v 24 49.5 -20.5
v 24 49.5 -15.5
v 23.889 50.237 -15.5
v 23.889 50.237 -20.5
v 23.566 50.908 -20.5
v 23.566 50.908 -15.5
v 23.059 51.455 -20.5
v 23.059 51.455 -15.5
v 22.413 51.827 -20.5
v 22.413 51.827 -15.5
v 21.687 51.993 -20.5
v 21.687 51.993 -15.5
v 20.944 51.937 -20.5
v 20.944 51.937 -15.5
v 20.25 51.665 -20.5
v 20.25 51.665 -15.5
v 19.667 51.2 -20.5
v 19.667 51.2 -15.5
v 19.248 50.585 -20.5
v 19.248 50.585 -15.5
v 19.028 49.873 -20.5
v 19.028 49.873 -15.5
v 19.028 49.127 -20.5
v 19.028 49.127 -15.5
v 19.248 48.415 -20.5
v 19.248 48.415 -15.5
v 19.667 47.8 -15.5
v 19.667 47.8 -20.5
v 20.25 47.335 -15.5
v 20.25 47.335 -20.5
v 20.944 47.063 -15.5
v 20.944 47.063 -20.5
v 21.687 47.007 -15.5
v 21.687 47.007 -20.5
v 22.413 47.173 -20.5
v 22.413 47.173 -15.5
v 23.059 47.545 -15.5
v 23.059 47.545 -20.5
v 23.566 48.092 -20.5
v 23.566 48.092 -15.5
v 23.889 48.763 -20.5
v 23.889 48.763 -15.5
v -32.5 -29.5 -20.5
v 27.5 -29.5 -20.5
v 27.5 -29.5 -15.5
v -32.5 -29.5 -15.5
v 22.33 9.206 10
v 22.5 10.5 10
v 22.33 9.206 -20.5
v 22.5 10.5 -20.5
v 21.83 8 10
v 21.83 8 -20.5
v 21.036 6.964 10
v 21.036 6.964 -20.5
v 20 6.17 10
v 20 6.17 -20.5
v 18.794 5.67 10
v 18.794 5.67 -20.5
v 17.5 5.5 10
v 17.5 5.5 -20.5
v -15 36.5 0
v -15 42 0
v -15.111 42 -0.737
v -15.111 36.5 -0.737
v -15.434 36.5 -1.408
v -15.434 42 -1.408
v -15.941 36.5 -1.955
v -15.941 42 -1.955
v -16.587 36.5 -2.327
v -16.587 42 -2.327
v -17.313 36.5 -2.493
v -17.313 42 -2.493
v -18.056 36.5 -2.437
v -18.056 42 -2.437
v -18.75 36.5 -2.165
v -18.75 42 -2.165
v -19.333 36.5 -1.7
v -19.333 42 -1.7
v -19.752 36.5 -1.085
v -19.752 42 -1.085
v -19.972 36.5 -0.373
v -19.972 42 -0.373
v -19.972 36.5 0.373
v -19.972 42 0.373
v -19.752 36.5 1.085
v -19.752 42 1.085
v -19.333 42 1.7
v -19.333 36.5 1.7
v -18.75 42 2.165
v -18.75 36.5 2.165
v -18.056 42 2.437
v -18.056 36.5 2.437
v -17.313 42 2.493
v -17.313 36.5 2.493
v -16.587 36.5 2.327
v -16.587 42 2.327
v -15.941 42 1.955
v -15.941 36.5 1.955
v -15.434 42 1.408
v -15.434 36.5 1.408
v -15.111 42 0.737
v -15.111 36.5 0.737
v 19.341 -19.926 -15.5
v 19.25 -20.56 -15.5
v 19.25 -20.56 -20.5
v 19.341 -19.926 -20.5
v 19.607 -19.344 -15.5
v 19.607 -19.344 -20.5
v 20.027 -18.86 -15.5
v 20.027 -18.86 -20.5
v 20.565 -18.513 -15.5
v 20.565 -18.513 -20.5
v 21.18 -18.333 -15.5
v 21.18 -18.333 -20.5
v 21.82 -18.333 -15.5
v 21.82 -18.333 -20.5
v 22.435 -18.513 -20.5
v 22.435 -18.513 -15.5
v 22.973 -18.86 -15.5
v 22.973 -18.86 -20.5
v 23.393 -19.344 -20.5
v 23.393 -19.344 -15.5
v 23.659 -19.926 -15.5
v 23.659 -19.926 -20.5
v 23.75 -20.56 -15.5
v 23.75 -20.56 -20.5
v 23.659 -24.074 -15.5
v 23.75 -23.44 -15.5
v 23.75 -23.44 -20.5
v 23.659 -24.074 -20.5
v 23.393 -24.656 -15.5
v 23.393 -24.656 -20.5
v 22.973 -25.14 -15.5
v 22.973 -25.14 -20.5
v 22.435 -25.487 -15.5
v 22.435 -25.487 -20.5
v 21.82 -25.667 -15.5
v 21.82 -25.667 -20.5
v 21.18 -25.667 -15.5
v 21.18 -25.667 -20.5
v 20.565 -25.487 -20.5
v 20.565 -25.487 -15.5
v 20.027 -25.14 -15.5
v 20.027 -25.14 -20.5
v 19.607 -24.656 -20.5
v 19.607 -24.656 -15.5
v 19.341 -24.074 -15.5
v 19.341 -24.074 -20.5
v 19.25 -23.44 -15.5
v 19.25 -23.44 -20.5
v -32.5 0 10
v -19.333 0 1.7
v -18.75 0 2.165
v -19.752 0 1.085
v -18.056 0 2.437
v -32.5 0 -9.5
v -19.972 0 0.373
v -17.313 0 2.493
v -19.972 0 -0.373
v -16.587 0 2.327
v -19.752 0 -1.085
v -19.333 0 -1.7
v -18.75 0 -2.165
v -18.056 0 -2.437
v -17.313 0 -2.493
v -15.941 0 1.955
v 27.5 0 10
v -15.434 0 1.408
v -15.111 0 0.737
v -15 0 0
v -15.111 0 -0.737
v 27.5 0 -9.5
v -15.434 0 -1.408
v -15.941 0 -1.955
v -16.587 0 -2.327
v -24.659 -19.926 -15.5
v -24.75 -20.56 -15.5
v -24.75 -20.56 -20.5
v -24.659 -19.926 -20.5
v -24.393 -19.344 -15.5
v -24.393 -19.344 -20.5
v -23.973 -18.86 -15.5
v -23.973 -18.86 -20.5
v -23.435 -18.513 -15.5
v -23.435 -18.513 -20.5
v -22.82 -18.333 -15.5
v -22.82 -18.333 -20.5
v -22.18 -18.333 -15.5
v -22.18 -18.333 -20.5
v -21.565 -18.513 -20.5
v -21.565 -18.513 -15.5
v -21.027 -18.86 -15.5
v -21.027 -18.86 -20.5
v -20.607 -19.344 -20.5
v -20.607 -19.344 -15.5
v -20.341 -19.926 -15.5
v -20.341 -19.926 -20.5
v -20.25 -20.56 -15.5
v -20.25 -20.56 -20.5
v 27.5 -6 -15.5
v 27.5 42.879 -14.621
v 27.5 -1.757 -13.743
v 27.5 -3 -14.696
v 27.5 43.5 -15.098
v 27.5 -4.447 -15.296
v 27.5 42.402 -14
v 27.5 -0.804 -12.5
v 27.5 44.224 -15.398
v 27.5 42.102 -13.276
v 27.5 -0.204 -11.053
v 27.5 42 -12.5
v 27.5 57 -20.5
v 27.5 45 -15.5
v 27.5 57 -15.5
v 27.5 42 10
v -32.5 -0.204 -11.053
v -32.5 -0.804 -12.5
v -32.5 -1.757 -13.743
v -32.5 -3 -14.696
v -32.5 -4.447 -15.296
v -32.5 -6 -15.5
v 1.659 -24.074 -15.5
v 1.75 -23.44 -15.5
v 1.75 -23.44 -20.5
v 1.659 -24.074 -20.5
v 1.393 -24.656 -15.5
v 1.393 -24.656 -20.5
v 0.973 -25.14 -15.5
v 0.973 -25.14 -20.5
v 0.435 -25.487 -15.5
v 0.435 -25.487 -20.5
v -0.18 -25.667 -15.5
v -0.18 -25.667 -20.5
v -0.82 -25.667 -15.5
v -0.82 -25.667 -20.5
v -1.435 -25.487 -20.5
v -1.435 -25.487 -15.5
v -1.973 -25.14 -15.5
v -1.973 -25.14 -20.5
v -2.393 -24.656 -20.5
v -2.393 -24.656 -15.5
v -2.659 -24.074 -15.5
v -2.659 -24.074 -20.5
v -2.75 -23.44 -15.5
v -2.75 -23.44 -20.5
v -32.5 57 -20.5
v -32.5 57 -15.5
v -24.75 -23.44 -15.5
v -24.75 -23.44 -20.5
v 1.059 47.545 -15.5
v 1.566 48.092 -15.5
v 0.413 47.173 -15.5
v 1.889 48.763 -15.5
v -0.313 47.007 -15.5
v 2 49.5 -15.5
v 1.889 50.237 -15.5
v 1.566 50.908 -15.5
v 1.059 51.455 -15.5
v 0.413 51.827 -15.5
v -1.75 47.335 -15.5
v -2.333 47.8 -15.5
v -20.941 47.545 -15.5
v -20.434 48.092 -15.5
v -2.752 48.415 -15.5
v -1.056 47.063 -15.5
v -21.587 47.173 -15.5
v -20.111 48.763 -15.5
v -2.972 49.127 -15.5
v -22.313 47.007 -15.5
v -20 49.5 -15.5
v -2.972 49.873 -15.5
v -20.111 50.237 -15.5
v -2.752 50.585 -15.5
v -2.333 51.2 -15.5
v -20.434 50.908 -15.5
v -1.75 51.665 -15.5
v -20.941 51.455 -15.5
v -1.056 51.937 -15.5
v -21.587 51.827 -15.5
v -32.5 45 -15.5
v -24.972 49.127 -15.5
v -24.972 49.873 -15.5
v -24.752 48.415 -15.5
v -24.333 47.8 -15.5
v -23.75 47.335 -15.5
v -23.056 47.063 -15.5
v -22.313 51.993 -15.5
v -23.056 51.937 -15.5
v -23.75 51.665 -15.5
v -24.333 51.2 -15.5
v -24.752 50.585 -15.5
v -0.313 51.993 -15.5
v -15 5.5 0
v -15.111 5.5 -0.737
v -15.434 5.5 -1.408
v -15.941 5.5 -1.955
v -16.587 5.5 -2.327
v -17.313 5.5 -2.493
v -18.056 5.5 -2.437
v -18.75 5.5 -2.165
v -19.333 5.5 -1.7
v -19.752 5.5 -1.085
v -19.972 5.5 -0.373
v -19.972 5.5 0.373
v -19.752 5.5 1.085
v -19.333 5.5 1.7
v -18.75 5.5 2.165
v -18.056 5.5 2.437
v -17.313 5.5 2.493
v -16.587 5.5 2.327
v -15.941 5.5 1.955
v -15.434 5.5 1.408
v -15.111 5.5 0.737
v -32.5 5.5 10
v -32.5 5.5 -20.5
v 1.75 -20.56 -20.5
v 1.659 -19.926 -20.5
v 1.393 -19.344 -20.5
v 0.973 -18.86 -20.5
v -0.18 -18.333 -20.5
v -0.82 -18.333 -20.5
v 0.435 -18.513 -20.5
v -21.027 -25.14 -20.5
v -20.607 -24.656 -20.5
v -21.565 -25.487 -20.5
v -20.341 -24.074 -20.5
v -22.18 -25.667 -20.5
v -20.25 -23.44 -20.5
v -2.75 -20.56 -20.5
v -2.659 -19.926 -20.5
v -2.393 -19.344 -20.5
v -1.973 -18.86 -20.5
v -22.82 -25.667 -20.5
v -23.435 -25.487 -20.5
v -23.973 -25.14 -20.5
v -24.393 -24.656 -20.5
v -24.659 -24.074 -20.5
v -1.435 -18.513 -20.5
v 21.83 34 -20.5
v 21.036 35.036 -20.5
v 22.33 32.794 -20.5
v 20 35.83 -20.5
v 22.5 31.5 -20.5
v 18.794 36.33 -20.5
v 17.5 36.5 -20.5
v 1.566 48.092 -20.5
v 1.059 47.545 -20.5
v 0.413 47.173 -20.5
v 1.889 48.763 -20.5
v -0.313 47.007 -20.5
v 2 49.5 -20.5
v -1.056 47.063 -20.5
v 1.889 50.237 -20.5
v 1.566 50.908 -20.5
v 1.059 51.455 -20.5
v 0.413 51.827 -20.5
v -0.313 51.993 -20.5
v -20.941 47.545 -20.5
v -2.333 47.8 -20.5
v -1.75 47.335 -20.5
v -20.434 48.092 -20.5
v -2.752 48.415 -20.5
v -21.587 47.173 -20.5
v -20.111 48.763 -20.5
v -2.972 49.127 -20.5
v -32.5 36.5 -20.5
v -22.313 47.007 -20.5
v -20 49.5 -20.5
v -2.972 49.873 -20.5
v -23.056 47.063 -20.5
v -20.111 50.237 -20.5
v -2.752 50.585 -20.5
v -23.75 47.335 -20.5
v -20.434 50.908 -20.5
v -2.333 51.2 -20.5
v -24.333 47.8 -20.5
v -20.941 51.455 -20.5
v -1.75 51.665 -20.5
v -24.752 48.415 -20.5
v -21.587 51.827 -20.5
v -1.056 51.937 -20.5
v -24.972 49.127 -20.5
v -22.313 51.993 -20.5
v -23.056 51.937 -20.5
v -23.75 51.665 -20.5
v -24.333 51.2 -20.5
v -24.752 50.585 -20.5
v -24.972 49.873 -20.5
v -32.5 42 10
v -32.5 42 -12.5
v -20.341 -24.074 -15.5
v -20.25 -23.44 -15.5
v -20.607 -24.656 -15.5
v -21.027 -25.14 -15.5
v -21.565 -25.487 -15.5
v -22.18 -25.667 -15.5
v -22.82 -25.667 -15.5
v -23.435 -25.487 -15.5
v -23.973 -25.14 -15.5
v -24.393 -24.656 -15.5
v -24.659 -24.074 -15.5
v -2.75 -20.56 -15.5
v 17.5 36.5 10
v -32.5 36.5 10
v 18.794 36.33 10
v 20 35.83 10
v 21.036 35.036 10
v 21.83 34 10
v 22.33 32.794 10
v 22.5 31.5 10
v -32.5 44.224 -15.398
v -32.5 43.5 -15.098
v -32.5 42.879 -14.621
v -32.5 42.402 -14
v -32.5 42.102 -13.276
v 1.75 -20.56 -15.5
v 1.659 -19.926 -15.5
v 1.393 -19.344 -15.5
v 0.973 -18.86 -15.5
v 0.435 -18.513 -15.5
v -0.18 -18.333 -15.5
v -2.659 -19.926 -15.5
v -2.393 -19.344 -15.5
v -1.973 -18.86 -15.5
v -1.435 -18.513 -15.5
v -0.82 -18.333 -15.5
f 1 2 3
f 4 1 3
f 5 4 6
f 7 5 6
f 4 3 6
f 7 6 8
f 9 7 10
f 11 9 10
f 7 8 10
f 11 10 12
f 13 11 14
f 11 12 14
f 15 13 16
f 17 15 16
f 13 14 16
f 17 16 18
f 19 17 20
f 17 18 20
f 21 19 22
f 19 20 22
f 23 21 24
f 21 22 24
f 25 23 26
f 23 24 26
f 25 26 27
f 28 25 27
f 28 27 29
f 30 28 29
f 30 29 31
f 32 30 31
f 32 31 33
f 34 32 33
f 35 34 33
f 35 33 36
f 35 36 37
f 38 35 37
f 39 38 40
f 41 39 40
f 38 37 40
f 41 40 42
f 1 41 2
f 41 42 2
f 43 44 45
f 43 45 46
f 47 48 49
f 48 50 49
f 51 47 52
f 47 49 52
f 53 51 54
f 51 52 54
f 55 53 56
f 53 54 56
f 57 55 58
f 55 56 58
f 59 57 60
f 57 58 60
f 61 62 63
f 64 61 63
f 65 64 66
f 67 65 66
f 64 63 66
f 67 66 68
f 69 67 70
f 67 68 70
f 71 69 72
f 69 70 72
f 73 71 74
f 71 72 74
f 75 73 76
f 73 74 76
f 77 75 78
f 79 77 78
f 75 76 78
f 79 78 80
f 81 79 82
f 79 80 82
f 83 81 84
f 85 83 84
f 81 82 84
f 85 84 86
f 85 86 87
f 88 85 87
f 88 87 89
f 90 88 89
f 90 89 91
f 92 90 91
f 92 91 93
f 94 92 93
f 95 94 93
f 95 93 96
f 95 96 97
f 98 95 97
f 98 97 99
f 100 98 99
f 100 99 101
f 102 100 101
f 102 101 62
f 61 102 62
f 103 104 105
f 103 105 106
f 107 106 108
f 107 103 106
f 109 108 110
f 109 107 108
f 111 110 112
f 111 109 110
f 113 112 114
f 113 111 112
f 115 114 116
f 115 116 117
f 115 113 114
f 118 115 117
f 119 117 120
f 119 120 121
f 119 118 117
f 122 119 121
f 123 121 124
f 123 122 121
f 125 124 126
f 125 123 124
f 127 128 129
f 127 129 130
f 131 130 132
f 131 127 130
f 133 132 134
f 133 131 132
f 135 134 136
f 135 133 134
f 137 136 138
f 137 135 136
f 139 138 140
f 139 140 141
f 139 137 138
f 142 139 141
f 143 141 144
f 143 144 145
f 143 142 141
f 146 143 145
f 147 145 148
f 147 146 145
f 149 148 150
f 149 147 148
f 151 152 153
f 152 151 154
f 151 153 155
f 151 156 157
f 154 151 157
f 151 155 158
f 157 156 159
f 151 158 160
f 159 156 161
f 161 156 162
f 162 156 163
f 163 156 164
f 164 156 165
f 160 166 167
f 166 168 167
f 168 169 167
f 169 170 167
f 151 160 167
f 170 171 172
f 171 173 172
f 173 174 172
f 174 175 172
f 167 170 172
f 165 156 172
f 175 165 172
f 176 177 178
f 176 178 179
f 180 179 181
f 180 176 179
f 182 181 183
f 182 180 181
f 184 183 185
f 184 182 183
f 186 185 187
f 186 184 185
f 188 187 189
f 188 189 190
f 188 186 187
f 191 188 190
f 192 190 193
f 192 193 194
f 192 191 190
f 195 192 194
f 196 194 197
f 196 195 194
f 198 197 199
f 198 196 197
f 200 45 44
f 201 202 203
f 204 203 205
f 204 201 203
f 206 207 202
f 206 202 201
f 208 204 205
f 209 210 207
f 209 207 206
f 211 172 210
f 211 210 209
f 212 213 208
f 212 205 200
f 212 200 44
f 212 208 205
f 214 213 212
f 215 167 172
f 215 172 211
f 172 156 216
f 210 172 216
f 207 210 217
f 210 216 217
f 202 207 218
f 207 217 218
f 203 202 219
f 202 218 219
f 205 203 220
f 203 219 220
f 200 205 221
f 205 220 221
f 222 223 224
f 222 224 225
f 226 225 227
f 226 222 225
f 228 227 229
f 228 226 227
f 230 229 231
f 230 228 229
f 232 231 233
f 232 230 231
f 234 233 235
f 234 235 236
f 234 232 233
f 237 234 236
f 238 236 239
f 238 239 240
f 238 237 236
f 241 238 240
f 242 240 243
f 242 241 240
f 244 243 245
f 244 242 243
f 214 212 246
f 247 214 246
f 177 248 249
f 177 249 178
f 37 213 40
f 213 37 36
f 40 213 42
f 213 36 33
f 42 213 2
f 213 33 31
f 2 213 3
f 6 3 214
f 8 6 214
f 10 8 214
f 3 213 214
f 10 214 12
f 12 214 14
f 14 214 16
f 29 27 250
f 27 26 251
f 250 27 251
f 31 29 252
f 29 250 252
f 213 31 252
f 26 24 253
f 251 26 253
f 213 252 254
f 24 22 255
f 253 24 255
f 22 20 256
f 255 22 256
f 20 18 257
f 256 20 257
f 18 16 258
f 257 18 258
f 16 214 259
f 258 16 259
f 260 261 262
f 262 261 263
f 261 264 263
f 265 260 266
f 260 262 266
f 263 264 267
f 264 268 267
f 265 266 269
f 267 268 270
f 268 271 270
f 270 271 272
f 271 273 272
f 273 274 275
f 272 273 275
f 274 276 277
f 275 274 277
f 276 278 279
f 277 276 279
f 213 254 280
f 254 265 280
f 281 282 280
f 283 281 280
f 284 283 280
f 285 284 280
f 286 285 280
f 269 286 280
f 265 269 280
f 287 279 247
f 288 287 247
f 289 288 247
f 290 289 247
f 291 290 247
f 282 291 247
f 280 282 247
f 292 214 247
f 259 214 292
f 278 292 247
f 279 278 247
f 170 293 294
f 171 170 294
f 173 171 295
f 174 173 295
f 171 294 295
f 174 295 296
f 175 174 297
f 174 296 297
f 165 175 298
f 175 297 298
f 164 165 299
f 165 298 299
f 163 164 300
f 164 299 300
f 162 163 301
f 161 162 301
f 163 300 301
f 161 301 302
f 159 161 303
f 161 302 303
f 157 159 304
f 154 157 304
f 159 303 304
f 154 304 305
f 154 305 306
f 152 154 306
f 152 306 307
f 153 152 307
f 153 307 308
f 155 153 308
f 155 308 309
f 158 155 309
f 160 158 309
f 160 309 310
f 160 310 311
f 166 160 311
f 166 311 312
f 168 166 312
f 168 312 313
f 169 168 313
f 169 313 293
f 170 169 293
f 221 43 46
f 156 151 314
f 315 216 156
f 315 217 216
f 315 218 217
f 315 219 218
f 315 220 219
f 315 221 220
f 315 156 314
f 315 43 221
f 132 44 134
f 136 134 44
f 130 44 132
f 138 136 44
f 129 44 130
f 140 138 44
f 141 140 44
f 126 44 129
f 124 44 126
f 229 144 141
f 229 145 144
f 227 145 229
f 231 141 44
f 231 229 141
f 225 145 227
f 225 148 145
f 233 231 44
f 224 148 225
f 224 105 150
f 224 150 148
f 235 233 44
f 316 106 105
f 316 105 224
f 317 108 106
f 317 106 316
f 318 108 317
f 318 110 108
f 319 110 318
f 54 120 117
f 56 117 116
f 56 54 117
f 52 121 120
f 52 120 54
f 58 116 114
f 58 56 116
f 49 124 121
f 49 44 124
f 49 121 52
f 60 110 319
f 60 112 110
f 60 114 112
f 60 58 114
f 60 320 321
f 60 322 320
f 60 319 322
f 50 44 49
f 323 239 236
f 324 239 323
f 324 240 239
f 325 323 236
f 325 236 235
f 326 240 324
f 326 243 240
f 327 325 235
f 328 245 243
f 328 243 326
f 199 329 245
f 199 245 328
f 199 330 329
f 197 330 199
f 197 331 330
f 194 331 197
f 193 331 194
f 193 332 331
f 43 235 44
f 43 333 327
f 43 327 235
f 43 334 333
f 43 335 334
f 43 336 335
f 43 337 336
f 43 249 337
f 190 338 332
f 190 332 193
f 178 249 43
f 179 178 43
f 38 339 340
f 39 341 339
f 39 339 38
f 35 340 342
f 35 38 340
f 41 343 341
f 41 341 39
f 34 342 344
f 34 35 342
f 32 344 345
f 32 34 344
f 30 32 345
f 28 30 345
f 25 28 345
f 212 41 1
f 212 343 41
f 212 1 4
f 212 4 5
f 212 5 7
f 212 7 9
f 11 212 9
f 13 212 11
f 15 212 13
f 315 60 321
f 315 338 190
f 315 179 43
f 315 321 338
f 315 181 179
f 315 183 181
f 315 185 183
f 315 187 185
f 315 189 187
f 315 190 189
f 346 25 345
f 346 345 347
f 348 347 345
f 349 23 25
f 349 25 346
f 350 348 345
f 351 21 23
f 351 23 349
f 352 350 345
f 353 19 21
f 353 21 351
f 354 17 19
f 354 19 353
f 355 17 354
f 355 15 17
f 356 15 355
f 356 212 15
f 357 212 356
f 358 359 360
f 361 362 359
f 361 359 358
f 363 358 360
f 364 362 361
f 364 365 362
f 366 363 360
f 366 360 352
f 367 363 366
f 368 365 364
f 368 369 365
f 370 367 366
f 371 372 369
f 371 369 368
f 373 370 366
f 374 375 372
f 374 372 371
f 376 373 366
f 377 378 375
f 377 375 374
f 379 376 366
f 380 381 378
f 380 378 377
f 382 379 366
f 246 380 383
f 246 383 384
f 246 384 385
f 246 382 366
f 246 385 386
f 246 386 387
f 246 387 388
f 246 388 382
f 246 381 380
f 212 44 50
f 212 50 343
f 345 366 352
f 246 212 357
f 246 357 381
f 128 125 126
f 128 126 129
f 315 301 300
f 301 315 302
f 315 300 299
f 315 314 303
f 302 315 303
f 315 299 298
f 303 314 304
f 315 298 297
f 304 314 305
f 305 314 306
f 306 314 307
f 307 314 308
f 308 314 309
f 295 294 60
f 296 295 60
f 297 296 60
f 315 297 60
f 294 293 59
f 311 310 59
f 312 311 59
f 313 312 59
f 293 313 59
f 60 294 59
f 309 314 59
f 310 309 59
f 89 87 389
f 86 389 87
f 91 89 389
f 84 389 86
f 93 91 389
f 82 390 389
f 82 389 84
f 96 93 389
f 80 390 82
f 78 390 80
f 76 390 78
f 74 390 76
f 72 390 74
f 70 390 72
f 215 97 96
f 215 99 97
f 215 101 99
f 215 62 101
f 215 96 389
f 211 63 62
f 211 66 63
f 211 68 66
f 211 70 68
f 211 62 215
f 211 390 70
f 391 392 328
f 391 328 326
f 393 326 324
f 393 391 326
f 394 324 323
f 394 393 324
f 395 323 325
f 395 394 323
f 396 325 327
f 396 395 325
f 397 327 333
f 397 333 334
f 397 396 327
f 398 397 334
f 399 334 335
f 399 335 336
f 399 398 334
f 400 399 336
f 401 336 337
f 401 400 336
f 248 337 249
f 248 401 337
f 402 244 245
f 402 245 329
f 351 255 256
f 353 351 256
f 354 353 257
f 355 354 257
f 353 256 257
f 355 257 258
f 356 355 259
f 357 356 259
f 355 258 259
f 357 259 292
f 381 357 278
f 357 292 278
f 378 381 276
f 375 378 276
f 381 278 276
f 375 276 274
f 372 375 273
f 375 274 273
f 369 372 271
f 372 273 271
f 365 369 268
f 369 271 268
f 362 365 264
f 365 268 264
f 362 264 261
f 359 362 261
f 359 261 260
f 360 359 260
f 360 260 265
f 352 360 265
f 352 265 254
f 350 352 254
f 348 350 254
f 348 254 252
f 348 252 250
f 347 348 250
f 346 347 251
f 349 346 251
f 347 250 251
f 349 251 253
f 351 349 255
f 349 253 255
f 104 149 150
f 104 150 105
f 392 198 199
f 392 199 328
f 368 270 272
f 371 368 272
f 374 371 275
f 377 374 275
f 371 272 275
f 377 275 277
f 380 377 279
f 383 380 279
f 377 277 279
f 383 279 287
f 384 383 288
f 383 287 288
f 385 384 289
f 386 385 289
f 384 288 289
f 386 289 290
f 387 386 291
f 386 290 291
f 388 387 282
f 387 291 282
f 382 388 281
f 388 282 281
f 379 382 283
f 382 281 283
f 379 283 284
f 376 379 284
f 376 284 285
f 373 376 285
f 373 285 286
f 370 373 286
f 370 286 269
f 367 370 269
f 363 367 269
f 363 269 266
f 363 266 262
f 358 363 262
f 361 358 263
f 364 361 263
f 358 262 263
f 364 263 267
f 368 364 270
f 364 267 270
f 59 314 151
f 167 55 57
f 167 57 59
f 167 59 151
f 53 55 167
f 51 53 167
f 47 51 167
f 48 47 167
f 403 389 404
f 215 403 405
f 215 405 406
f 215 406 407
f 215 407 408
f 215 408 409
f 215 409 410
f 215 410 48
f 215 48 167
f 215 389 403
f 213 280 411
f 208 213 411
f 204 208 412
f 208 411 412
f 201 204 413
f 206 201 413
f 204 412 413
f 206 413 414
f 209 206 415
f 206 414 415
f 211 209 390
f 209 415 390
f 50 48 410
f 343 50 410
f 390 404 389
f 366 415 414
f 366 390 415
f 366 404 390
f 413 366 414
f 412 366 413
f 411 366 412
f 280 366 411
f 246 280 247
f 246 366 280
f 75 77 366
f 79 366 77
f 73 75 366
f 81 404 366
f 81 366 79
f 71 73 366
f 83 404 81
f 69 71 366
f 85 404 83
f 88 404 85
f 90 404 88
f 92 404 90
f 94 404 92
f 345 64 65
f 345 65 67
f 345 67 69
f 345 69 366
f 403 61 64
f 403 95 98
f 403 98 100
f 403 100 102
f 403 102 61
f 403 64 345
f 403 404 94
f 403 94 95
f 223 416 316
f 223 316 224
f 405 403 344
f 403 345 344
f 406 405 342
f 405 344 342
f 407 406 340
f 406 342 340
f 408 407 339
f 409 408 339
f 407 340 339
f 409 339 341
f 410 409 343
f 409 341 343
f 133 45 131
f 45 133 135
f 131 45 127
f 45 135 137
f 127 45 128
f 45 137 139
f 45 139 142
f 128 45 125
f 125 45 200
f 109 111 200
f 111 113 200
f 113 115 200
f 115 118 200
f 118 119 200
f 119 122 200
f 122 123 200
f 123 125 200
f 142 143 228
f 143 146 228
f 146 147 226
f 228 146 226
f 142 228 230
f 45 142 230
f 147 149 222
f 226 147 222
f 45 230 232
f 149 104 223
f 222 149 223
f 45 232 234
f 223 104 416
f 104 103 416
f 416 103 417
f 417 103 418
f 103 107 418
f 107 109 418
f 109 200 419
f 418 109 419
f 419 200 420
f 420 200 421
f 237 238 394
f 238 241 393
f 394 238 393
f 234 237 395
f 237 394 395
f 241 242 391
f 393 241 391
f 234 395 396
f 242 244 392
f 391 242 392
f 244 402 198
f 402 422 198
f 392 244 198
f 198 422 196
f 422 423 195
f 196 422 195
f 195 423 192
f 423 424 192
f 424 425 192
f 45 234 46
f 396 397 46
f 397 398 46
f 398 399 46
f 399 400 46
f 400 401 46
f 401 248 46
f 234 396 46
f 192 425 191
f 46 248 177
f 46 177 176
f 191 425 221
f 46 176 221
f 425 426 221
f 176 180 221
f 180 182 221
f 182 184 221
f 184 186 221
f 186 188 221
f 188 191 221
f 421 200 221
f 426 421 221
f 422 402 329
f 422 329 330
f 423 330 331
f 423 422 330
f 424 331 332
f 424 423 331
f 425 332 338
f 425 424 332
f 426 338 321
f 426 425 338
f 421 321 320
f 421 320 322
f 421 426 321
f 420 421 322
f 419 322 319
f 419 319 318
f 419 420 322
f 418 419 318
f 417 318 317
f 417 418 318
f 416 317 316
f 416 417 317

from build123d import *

# Parameters (mm, degrees)
SKETCH2_W           = 65
SKETCH2_H           = 50
EXTRUDE_5_DEPTH     = 42
SKETCH3_W           = 110
SKETCH3_H           = 31
CUT_EXTRUDE1_DEPTH  = 50
SKETCH4_R           = 2.5
CUT_EXTRUDE2_DEPTH  = 50
SKETCH5_W           = 65
SKETCH5_H           = 15
CUT_EXTRUDE3_DEPTH  = 50
SKETCH6_W           = 65
SKETCH6_H           = 4.5
CUT_EXTRUDE4_DEPTH  = 50
SKETCH7_W           = 65
SKETCH7_H           = 35
BOSS_EXTRUDE2_DEPTH = 5
FILLET1_R           = 5
FILLET2_R           = 6
SKETCH8_W           = 65
SKETCH8_H           = 15
BOSS_EXTRUDE3_DEPTH = 5
FILLET3_R           = 3
SKETCH9_R           = 2.5
CUT_EXTRUDE5_DEPTH  = 5
CUT_EXTRUDE6_DEPTH  = 5
SKETCH11_W          = 5
SKETCH11_H          = 86.5
CUT_EXTRUDE8_DEPTH  = 71


with BuildPart() as part:
    # Sketch2 → Extrude 5 (new body)
    with BuildSketch(Plane(origin=(0, 0, 0), x_dir=(1, 0, 0), z_dir=(0, 1, 0))):
        Rectangle(SKETCH2_W, SKETCH2_H)
    extrude(amount=EXTRUDE_5_DEPTH)

    # Sketch3 → Cut-Extrude1 (cut)
    with BuildSketch(Plane.XY.offset(25)):
        with Locations((-32.5, 21)):
            Rectangle(SKETCH3_W, SKETCH3_H)
    extrude(amount=-CUT_EXTRUDE1_DEPTH, mode=Mode.SUBTRACT)

    # Sketch4 → Cut-Extrude2 (cut)
    with BuildSketch(Plane(origin=(0, 42, 0), x_dir=(1, 0, 0), z_dir=(0, 1, 0))):
        with Locations((-17.5, 0)):
            Circle(SKETCH4_R)
    extrude(amount=-CUT_EXTRUDE2_DEPTH, mode=Mode.SUBTRACT)

    # Sketch5 → Cut-Extrude3 (cut)
    with BuildSketch(Plane(origin=(0, 42, 0), x_dir=(1, 0, 0), z_dir=(0, 1, 0))):
        with Locations((0, -17.5)):
            Rectangle(SKETCH5_W, SKETCH5_H)
    extrude(amount=-CUT_EXTRUDE3_DEPTH, mode=Mode.SUBTRACT)

    # Sketch6 → Cut-Extrude4 (cut)
    with BuildSketch(Plane(origin=(0, 42, 0), x_dir=(1, 0, 0), z_dir=(0, 1, 0))):
        with Locations((0, 22.75)):
            Rectangle(SKETCH6_W, SKETCH6_H)
    extrude(amount=-CUT_EXTRUDE4_DEPTH, mode=Mode.SUBTRACT)

    # Sketch7 → Boss-Extrude2 (add)
    with BuildSketch(Plane(origin=(0, 0, -20.5), x_dir=(-1, 0, 0), z_dir=(0, 0, -1))):
        with Locations((0, -12)):
            Rectangle(SKETCH7_W, SKETCH7_H)
    extrude(amount=-BOSS_EXTRUDE2_DEPTH)

    # Fillet1
    fillet1_edges = [part.edges().sort_by_distance(p)[0] for p in [
        (22.5, 5.5, -5.25),
        (22.5, 36.5, -5.25),
    ]]
    fillet(fillet1_edges, radius=FILLET1_R)

    # Fillet2
    fillet2_edges = [part.edges().sort_by_distance(p)[0] for p in [
        (0, 0, -15.5),
    ]]
    fillet(fillet2_edges, radius=FILLET2_R)

    # Sketch8 → Boss-Extrude3 (add)
    with BuildSketch(Plane(origin=(0, 0, -20.5), x_dir=(-1, 0, 0), z_dir=(0, 0, -1))):
        with Locations((0, 49.5)):
            Rectangle(SKETCH8_W, SKETCH8_H)
    extrude(amount=-BOSS_EXTRUDE3_DEPTH)

    # Fillet3
    fillet3_edges = [part.edges().sort_by_distance(p)[0] for p in [
        (0, 42, -15.5),
    ]]
    fillet(fillet3_edges, radius=FILLET3_R)

    # Sketch9 → Cut-Extrude5 (cut)
    with BuildSketch(Plane.XY.offset(-15.5)):
        with Locations((-22.5, 49.5)):
            Circle(SKETCH9_R)
        with Locations((-0.5, 49.5)):
            Circle(SKETCH9_R)
        with Locations((21.5, 49.5)):
            Circle(SKETCH9_R)
    extrude(amount=-CUT_EXTRUDE5_DEPTH, mode=Mode.SUBTRACT)

    # Sketch10 → Cut-Extrude6 (cut)
    with BuildSketch(Plane.XY.offset(-15.5)):
        with BuildLine():
            Line((-24.75, -23.440008753), (-24.75, -20.559991247))
            ThreePointArc((-24.75, -20.559991247), (-22.5, -18.309991247), (-20.25, -20.559991247))
            Line((-20.25, -20.559991247), (-20.25, -23.440008753))
            ThreePointArc((-20.25, -23.440008753), (-22.5, -25.690008753), (-24.75, -23.440008753))
        make_face()
        with BuildLine():
            Line((-2.75, -23.440008753), (-2.75, -20.559991247))
            ThreePointArc((-2.75, -20.559991247), (-0.5, -18.309991247), (1.75, -20.559991247))
            Line((1.75, -20.559991247), (1.75, -23.440008753))
            ThreePointArc((1.75, -23.440008753), (-0.5, -25.690008753), (-2.75, -23.440008753))
        make_face()
        with BuildLine():
            Line((19.25, -23.440008753), (19.25, -20.559991247))
            ThreePointArc((19.25, -20.559991247), (21.5, -18.309991247), (23.75, -20.559991247))
            Line((23.75, -20.559991247), (23.75, -23.440008753))
            ThreePointArc((23.75, -23.440008753), (21.5, -25.690008753), (19.25, -23.440008753))
        make_face()
    extrude(amount=-CUT_EXTRUDE6_DEPTH, mode=Mode.SUBTRACT)

    # Sketch11 → Cut-Extrude8 (cut)
    with BuildSketch(Plane.XY.offset(10)):
        with Locations((30, 13.75)):
            Rectangle(SKETCH11_W, SKETCH11_H)
    extrude(amount=-CUT_EXTRUDE8_DEPTH, mode=Mode.SUBTRACT)


solid = part.part
